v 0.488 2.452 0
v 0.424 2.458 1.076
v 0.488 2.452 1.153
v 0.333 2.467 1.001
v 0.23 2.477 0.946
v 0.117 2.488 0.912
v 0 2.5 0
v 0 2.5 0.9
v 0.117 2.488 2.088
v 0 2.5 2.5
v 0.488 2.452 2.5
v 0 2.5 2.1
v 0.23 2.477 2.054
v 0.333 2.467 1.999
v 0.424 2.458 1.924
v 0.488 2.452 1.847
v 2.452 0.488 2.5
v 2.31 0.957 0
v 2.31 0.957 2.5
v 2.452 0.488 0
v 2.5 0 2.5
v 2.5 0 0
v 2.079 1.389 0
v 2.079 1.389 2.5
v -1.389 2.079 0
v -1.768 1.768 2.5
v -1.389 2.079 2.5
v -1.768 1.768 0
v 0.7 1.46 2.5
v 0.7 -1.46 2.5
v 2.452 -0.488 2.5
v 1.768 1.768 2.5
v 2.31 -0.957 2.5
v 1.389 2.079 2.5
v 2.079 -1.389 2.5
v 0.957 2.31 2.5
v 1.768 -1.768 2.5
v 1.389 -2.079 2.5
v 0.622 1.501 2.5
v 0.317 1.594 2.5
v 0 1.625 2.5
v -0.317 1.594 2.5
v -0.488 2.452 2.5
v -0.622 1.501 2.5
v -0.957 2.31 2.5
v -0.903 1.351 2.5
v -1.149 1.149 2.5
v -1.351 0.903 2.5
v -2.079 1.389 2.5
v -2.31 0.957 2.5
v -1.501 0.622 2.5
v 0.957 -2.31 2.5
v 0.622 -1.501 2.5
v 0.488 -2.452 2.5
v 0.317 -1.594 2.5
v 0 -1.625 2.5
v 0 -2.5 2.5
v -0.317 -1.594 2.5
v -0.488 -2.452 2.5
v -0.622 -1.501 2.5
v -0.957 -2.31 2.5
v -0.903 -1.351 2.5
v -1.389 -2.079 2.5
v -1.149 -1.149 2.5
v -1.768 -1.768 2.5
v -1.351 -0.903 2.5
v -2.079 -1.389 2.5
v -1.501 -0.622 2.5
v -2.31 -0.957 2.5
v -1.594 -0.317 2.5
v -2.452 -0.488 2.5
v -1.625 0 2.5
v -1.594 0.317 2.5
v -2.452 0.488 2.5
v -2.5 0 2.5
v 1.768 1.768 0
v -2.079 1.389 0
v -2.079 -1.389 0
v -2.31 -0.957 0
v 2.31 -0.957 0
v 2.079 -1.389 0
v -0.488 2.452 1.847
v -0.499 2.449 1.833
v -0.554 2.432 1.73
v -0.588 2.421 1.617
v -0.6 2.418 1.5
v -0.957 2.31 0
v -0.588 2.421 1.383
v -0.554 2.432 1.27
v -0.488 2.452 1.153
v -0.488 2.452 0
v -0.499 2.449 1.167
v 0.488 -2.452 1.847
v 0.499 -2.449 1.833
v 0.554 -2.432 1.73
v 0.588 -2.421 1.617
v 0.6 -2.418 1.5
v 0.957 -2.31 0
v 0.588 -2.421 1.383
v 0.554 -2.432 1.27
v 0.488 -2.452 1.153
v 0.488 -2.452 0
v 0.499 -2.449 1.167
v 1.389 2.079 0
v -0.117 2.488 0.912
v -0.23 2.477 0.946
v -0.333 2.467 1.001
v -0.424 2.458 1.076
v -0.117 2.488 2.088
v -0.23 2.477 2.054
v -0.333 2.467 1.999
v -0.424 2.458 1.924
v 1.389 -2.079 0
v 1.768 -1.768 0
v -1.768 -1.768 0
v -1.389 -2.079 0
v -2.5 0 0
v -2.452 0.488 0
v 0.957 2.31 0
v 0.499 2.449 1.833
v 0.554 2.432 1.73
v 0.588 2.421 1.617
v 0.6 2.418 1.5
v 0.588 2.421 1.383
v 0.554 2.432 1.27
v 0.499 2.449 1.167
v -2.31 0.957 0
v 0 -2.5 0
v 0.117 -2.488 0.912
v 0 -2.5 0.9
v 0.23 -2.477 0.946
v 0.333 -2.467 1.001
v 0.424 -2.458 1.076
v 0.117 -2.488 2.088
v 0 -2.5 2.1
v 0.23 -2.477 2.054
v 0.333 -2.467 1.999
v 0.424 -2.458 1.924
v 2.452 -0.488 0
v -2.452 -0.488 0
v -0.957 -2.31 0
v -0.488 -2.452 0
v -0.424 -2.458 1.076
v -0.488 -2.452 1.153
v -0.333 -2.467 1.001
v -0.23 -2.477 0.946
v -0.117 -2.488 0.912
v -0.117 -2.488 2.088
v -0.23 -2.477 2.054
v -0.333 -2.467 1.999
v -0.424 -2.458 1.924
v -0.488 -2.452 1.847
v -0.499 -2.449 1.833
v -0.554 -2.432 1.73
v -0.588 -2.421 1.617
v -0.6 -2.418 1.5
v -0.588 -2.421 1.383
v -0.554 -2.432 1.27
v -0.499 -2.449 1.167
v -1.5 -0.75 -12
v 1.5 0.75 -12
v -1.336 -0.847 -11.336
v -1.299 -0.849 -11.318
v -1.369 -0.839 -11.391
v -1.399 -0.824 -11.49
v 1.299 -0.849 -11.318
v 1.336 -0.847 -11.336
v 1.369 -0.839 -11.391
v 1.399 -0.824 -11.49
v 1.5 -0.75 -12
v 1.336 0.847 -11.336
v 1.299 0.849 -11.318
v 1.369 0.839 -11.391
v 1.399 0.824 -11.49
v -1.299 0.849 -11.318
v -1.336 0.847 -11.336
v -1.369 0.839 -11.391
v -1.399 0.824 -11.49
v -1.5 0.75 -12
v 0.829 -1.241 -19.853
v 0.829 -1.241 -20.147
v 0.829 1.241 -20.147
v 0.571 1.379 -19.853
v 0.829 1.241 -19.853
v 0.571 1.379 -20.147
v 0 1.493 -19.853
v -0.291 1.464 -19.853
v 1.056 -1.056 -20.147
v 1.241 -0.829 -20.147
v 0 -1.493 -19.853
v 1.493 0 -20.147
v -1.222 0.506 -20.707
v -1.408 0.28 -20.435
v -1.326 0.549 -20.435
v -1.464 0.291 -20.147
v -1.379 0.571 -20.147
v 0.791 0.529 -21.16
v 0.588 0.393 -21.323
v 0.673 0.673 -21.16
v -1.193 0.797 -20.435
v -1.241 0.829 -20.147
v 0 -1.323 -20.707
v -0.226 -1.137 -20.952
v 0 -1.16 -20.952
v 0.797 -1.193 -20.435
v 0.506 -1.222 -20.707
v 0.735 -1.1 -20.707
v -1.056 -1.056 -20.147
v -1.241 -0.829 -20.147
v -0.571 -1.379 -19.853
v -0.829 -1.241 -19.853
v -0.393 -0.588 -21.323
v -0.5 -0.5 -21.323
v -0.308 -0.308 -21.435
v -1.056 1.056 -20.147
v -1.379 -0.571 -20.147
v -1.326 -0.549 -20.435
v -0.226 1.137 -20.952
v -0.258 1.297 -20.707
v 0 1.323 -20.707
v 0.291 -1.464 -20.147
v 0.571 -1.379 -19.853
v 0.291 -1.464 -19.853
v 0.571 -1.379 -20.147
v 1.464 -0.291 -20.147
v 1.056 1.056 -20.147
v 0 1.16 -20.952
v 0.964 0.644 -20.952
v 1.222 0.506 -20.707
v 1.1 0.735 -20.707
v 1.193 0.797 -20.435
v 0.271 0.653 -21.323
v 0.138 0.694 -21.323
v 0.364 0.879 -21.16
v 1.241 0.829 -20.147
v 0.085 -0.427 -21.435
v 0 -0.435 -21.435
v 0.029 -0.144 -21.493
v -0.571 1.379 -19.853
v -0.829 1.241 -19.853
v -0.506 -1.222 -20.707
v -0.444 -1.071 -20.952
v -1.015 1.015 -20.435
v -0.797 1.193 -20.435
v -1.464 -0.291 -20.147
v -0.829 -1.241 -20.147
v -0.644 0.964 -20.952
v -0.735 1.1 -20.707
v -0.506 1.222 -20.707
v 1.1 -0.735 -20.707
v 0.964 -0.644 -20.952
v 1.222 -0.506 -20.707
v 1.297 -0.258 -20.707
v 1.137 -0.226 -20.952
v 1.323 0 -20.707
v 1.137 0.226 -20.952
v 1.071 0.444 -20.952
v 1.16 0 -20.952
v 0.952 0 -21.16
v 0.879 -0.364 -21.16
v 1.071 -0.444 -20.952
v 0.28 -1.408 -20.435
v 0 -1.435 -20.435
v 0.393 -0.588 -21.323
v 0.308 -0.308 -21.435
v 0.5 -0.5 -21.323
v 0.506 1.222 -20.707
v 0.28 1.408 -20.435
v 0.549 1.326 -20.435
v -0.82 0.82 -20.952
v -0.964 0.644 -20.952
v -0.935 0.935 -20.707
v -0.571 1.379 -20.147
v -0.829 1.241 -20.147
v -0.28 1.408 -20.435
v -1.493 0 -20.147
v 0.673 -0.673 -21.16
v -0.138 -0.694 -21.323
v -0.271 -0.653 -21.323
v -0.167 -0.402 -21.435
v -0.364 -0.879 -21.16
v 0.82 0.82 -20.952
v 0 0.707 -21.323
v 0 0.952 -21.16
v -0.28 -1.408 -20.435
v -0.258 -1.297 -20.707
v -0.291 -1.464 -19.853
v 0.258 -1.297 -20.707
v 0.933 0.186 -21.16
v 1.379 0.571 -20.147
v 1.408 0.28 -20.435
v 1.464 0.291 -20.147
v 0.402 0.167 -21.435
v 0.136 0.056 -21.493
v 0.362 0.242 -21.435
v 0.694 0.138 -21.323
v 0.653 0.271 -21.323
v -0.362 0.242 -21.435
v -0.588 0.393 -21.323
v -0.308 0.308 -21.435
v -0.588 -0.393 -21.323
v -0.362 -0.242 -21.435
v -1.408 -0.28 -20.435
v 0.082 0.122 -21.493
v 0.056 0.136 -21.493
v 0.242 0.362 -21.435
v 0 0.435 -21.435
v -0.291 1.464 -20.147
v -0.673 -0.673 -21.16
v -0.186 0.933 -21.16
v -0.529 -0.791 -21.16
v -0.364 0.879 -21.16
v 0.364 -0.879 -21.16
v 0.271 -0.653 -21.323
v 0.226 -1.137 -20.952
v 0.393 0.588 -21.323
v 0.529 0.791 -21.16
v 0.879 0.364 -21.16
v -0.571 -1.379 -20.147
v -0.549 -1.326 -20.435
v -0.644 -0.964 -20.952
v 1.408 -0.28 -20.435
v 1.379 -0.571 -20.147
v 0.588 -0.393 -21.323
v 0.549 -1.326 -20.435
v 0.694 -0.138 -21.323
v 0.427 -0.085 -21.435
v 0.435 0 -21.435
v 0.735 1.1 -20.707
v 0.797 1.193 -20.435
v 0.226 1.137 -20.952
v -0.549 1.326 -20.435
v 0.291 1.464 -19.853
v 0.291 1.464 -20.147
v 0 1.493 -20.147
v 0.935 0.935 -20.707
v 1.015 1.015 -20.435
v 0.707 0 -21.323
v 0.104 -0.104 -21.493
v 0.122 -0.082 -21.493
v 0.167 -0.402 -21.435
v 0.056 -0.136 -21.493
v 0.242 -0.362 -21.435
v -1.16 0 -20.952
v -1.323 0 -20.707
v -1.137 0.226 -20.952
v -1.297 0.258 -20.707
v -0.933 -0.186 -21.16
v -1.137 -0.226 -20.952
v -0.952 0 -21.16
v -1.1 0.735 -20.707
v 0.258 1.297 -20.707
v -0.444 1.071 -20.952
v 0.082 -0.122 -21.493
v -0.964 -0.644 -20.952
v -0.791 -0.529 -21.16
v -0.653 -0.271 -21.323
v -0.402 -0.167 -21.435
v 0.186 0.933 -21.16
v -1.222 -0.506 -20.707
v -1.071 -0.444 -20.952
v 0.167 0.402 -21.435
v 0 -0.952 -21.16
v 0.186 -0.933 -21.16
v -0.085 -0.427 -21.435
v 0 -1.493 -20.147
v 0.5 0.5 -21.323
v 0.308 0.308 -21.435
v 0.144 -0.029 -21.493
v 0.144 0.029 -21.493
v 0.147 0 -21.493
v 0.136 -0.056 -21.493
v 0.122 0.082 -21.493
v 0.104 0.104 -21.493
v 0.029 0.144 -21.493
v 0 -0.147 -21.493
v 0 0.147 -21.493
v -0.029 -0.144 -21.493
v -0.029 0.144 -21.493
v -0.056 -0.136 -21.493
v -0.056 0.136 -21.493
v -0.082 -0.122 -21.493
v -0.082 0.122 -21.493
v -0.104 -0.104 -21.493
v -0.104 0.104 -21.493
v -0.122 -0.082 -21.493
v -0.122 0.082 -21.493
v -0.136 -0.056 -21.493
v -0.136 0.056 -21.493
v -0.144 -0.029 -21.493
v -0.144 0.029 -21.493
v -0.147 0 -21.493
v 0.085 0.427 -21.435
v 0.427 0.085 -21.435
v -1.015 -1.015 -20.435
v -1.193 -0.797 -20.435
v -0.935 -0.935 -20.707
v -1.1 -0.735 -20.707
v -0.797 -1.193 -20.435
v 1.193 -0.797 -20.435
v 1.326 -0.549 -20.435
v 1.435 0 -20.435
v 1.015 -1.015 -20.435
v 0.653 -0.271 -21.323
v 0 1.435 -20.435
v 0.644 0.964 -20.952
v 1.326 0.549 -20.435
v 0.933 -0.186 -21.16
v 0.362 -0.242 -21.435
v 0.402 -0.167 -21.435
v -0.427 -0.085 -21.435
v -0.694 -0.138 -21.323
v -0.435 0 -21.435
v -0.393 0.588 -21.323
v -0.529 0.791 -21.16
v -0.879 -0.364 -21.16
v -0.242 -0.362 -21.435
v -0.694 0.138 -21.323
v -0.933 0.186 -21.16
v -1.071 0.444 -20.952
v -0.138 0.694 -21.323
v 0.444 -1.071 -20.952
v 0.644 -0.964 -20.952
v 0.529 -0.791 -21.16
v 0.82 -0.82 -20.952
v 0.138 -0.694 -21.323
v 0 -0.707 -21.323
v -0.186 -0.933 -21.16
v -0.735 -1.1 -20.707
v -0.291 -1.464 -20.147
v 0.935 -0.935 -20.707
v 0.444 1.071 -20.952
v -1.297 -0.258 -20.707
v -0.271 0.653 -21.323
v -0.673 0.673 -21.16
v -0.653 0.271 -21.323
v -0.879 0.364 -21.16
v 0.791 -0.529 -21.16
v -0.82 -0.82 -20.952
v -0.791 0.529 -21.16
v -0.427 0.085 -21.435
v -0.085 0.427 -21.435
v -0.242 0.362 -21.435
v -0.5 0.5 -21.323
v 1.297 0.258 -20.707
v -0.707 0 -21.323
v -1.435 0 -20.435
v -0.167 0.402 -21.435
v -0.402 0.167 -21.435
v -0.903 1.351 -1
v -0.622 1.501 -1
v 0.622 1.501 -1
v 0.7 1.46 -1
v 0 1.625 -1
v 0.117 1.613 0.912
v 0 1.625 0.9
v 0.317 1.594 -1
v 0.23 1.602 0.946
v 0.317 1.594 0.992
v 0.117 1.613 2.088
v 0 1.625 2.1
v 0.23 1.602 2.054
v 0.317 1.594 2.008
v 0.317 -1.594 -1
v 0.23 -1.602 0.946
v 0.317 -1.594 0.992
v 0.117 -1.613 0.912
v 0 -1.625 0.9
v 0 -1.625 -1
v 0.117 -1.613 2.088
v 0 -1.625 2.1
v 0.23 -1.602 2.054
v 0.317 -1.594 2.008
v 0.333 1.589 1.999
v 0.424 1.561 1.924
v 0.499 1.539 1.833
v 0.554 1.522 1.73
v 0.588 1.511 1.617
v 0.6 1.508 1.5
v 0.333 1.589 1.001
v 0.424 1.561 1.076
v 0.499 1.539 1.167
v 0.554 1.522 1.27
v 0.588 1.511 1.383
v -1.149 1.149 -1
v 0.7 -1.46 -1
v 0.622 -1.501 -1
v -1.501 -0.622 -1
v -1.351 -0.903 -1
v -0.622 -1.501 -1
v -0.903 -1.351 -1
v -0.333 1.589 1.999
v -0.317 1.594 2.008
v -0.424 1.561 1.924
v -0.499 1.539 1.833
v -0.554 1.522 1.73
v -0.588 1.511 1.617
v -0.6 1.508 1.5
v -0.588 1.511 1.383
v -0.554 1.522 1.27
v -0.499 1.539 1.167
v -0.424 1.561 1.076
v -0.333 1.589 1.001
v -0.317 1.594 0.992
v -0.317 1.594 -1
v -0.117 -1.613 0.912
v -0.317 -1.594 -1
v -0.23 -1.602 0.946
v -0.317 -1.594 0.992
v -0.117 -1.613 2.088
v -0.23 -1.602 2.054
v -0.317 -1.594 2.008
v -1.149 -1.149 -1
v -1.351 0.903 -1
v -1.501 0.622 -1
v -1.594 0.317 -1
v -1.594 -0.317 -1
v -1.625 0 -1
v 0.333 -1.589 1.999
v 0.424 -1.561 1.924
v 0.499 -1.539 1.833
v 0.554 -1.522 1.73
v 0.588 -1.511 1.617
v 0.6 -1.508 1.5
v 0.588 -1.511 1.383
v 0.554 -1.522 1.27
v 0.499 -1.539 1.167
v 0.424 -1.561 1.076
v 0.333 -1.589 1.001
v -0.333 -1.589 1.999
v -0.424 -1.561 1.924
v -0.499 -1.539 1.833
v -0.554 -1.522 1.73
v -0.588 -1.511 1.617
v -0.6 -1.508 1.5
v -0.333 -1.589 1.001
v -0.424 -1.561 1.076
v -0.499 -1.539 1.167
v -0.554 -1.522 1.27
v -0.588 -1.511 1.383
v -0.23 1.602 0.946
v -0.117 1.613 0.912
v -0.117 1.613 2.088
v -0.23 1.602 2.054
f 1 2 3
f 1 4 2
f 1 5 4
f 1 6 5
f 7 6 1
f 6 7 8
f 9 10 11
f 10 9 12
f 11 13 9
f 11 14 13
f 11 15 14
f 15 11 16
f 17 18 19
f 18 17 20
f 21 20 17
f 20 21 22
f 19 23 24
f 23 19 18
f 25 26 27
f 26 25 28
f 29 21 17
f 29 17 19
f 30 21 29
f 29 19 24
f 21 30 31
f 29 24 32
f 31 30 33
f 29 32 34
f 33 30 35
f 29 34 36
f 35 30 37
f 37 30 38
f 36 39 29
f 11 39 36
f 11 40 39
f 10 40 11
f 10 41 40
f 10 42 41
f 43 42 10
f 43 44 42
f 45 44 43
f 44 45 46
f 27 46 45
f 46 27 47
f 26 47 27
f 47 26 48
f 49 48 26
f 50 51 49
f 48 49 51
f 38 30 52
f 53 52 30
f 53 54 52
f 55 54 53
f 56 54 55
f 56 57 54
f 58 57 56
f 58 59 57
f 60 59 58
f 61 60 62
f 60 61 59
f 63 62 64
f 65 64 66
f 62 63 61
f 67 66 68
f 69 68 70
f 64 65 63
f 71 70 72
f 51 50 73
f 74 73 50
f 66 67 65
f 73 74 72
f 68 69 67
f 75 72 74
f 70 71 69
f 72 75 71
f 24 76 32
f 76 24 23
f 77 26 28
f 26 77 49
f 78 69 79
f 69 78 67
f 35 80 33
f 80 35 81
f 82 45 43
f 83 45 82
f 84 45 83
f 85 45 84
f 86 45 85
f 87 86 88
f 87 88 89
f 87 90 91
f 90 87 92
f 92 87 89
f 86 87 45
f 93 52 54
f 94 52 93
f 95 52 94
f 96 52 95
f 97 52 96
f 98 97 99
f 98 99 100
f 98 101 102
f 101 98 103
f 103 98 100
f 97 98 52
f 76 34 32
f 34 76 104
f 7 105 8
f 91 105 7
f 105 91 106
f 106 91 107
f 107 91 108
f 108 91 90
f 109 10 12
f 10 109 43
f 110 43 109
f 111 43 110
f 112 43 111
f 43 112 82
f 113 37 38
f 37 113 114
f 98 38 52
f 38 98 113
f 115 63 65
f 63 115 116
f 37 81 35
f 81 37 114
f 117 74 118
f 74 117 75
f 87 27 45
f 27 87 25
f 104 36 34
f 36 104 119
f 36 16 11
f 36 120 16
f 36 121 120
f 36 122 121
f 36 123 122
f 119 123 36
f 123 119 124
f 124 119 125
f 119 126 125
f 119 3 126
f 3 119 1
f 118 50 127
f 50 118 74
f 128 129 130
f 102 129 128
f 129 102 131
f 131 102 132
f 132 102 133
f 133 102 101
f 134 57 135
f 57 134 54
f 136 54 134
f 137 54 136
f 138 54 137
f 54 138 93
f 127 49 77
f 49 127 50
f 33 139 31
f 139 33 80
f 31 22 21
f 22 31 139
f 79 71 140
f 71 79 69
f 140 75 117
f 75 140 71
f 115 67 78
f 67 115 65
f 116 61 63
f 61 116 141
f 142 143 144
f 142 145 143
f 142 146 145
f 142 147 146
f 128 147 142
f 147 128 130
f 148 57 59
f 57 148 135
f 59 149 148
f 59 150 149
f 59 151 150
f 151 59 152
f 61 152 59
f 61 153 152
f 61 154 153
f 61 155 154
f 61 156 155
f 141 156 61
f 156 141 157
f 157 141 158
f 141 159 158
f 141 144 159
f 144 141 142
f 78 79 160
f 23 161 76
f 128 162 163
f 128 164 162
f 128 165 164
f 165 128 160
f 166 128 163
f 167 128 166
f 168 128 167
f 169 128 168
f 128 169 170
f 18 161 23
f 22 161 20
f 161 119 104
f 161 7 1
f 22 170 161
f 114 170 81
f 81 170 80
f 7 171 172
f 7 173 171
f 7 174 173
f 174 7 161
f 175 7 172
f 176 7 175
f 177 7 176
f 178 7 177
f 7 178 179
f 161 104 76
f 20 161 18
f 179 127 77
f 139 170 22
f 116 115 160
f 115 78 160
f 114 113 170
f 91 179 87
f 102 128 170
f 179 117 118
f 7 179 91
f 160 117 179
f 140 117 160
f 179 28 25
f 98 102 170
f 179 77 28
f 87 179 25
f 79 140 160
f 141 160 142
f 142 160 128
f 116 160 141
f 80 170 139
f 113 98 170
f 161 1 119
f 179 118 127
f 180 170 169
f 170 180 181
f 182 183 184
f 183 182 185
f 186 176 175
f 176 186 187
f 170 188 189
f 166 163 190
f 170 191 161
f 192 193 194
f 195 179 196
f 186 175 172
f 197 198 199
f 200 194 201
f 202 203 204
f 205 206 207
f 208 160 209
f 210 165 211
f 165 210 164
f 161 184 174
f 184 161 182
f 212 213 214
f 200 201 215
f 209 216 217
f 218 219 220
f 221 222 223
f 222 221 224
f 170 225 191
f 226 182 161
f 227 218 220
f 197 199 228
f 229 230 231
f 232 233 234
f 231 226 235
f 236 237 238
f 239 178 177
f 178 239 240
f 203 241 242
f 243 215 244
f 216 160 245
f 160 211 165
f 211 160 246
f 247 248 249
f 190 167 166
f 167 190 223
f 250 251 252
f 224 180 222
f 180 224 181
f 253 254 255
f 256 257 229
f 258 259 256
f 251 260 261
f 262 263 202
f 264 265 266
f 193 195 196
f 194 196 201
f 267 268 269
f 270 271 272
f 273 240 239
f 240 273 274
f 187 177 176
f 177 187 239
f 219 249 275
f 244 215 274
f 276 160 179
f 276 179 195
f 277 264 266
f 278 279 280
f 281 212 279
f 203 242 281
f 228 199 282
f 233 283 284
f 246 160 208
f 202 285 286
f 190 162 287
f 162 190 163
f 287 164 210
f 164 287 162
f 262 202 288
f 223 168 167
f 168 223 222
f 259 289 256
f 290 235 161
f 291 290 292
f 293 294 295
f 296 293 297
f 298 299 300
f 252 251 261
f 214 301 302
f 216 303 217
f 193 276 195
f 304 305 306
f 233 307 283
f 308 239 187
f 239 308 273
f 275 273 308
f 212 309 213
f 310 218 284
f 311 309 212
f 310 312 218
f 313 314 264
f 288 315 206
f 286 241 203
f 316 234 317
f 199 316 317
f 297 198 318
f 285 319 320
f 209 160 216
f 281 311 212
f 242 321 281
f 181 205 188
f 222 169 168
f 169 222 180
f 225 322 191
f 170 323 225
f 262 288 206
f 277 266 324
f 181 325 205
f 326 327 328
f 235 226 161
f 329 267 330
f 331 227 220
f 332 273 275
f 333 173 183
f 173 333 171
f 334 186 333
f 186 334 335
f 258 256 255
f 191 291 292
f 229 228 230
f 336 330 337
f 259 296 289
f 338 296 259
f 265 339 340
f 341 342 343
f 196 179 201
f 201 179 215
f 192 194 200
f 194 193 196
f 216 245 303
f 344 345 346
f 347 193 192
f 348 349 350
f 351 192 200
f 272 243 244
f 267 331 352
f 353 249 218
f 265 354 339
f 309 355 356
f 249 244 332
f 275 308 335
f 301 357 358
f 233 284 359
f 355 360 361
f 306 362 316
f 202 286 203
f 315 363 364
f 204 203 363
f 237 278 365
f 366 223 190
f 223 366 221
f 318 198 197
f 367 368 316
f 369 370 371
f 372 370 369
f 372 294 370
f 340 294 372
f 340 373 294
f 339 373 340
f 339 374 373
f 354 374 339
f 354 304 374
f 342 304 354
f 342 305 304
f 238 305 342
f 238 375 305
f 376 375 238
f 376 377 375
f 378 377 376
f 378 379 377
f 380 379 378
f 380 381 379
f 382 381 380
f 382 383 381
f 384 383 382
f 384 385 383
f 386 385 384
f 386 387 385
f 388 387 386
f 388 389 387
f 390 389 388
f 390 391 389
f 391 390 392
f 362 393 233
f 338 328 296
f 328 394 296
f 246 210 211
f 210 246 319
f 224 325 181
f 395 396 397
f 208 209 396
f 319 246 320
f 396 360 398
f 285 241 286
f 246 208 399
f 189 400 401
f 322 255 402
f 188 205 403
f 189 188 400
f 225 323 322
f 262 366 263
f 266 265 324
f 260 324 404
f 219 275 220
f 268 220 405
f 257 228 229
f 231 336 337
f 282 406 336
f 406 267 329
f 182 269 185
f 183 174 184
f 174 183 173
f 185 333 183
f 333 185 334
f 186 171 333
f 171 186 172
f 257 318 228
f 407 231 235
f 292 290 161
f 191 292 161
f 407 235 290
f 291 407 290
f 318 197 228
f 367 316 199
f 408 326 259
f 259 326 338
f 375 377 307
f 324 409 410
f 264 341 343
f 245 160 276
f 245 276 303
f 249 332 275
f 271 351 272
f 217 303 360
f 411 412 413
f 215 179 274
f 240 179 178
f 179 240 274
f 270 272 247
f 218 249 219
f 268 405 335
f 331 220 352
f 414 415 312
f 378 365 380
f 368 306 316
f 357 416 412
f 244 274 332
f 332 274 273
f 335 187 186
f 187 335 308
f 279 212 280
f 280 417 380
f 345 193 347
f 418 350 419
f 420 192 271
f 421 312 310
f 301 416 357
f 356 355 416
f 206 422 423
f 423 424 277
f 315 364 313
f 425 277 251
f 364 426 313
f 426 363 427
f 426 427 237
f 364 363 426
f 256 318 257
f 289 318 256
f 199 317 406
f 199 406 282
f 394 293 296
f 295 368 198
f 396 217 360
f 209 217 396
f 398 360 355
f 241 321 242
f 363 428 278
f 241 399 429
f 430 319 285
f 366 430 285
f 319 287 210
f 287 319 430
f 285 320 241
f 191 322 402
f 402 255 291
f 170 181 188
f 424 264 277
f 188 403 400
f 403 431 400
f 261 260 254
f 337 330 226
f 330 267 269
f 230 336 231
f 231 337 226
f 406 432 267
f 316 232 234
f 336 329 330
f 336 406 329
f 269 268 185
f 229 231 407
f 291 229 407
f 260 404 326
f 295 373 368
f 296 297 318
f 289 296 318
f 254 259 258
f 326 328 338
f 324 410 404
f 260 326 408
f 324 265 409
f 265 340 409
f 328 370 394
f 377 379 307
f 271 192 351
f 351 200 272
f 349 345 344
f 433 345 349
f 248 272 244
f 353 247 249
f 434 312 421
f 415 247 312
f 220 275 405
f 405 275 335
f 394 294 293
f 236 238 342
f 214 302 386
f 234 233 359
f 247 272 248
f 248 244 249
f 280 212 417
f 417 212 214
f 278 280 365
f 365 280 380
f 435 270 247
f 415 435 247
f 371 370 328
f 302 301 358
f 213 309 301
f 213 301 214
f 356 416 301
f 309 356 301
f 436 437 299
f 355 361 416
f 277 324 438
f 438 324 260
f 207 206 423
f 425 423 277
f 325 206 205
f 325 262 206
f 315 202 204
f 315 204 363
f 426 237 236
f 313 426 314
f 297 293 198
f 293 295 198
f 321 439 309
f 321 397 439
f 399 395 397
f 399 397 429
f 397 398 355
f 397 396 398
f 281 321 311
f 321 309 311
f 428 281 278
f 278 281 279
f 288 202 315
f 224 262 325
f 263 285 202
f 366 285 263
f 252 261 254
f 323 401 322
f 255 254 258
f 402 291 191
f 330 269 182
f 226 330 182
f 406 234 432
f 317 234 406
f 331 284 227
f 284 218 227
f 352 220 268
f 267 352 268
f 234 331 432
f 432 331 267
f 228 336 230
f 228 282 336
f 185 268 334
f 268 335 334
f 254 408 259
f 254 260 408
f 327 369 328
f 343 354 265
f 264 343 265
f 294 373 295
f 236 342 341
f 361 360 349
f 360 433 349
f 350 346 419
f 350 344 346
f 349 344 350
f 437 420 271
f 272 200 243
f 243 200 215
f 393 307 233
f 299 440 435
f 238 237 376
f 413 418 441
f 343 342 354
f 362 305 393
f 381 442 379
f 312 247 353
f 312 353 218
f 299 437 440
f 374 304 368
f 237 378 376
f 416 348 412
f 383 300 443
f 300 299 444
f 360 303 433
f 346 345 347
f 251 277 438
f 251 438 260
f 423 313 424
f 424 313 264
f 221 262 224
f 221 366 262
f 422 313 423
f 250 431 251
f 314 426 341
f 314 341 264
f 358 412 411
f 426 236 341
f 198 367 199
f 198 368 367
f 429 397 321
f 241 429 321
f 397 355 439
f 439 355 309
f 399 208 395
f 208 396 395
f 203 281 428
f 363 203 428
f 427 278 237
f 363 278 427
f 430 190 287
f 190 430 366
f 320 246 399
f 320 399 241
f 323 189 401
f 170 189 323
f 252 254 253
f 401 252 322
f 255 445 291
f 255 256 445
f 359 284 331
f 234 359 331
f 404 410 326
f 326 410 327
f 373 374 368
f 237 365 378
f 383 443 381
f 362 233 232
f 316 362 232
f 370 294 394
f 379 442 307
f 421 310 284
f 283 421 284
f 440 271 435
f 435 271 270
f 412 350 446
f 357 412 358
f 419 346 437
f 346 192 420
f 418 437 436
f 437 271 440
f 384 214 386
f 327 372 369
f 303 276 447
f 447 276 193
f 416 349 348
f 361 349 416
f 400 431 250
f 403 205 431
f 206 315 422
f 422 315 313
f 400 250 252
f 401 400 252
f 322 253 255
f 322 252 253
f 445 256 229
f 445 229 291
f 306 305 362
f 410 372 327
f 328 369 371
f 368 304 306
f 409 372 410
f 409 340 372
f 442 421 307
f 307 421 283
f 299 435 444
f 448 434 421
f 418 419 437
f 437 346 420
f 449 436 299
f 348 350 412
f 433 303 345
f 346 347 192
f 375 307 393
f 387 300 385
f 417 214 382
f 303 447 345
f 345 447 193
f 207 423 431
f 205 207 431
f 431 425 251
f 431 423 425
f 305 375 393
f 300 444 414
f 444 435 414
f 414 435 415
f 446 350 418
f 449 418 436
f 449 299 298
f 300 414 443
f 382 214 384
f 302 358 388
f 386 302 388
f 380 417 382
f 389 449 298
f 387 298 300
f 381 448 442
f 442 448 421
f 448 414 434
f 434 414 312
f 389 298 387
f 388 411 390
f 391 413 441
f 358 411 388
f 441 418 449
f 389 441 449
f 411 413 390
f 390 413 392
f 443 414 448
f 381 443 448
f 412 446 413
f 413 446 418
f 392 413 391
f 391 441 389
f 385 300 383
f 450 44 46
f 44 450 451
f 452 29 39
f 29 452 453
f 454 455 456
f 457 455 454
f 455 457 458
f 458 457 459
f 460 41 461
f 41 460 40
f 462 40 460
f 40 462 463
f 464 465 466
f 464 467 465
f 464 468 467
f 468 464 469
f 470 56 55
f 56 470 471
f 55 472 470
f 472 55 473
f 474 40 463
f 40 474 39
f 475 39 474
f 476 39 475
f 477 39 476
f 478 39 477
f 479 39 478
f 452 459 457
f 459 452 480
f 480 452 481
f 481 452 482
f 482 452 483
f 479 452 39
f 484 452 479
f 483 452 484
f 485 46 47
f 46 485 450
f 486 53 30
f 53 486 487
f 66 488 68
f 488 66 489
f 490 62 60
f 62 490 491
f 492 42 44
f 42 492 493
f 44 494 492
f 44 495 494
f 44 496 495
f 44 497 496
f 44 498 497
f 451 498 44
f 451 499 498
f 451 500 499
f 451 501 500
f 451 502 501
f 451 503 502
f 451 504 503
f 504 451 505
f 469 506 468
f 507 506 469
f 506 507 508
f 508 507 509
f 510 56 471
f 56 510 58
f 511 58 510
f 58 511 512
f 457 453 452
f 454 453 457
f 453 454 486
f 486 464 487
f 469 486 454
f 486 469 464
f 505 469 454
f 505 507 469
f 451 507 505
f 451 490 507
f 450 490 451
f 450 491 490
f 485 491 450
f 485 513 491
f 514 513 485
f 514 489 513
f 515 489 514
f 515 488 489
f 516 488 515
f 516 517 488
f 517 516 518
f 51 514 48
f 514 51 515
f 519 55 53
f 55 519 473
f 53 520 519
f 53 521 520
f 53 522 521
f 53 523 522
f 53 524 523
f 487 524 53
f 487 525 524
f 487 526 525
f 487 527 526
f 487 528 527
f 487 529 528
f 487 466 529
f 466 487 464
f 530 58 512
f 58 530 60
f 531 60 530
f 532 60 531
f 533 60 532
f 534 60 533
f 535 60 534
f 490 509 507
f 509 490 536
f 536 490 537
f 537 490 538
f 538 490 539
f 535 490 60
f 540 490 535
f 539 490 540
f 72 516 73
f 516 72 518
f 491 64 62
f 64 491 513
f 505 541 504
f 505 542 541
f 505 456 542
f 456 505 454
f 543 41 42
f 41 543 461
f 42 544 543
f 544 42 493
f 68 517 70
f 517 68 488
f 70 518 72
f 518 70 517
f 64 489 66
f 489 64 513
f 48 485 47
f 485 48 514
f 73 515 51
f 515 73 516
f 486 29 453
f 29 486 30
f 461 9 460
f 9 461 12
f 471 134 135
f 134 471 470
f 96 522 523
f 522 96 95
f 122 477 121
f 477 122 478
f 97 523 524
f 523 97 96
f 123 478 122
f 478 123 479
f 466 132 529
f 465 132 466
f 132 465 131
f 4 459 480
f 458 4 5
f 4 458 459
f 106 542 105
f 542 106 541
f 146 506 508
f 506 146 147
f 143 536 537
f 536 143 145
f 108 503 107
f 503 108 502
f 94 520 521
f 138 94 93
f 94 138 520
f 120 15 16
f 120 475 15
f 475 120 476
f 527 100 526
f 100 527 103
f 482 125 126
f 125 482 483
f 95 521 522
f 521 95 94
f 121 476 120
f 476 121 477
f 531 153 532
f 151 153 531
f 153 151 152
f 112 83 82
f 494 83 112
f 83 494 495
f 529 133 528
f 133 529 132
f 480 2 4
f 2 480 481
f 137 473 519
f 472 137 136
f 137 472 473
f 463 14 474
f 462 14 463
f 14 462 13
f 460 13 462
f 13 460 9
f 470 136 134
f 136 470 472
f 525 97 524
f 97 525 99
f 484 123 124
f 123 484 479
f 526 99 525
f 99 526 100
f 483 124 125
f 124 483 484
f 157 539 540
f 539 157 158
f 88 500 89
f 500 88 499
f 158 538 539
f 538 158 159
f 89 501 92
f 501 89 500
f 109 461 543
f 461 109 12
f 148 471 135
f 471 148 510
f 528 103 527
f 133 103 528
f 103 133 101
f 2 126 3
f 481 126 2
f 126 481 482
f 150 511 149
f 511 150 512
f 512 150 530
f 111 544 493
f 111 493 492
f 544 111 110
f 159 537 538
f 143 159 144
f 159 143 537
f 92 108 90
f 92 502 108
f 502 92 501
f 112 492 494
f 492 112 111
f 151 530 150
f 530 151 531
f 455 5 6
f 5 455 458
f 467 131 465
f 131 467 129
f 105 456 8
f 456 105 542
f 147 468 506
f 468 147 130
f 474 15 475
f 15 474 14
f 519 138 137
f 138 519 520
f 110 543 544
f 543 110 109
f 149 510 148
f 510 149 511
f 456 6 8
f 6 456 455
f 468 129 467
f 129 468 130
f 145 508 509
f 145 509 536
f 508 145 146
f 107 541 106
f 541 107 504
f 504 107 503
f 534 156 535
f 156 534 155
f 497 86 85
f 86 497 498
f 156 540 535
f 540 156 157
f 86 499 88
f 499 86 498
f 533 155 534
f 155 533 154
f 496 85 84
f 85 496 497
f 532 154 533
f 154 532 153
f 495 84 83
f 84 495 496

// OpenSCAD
// file: config_10cm.scad
// ============================================
// NuiBone - 10cm版 共通設定ファイル
// ============================================
// 10cmぬいぐるみ用ロボット骨格の寸法設定
// ※サーボはSG90では大きすぎるため、
//   より小型のサーボを推奨
// ============================================

// --- ぬいぐるみサイズ制約 ---
nui_height = 100;        // ぬいぐるみ全高 (mm)
nui_body_width = 28;     // 胴体最大幅 (mm)
nui_body_depth = 18;     // 胴体最大厚み (mm)

// --- 骨格寸法 ---
bone_thickness = 2.0;    // 骨格基本厚み (mm)
bone_width = 2.5;        // 骨格基本幅 (mm)

// 胴体フレーム
body_height = 30;        // 胴体高さ (mm)
body_width = 24;         // 胴体幅 (mm)
body_depth = 14;         // 胴体奥行き (mm)

// 肩
shoulder_width = 6;      // 肩部品幅 (mm)
shoulder_offset = 10;    // 肩の高さ位置（胴体上端から）

// 腕
arm_length = 22;         // 腕の長さ (mm)
arm_width = 3;           // 腕の幅 (mm)
arm_thickness = 1.5;     // 腕の厚み (mm)

// 足
foot_width = 8;          // 足幅 (mm)
foot_length = 10;        // 足長さ (mm)
foot_height = 4;         // 足高さ (mm)
leg_length = 20;         // 脚の長さ (mm)

// --- サーボ選択 ---
// 10cm版では以下のいずれかを推奨:
// 1. SG51R (5g) - 最小クラス
// 2. HK-5320 (3.7g) - 超小型
// 3. 自作リニアアクチュエータ

// SG51R寸法 (参考)
servo_width = 6.0;       // サーボ幅 (mm)
servo_height = 15.0;     // サーボ高さ (mm)
servo_depth = 12.0;      // サーボ奥行き (mm)
servo_shaft_height = 3;  // 出力軸高さ (mm)
servo_shaft_dia = 3.0;   // 出力軸直径 (mm)

// --- 代替案: 振動モーター版 ---
// サーボの代わりに偏心モーターで「ぷるぷる」動作
vibration_motor_dia = 6; // 振動モーター直径 (mm)
vibration_motor_len = 12;// 振動モーター長さ (mm)

// --- 磁石・重り（10cm版用）---
magnet_dia = 3;          // ネオジム磁石直径 (mm) - より小さい
magnet_height = 1.5;     // ネオジム磁石高さ (mm)
weight_hole_dia = 4;     // 重り穴直径 (mm)

// --- 呼吸機構（10cm版）---
breath_stroke = 2;       // 呼吸ストローク (mm)
breath_plate_size = 10;  // 呼吸プレートサイズ (mm)

// --- 印刷設定 ---
wall_thick = 0.8;        // 壁厚み (mm) - より薄く
tolerance = 0.25;        // 組み立て公差 (mm)
$fn = 32;                // 円の分割数

// --- 色設定（プレビュー用）---
color_bone = [0.9, 0.9, 0.85];
color_servo = [0.2, 0.2, 0.3];
color_magnet = [0.7, 0.7, 0.7];

// ============================================
// 10cm版の制約と推奨事項
// ============================================
//
// 【課題】
// - SG90 (12.2mm幅) は10cmぬいぐるみには大きすぎる
// - 電池も単3では大きい
//
// 【推奨構成】
// 1. マイクロサーボ版
//    - サーボ: SG51R または HK-5320
//    - 電源: LiPo 1S (3.7V) 100-200mAh
//    - 制御: ESP32-C3 または Seeed XIAO
//
// 2. 振動モーター版（簡易版）
//    - 振動モーター × 2-3個
//    - 「ぷるぷる」動作で生命感を表現
//    - サーボ制御不要で省スペース
//
// 3. SMA (形状記憶合金) 版
//    - 超薄型で柔軟
//    - ゆっくりした動きに最適
//    - 呼吸表現に理想的
// ============================================
// main file
// ============================================
// NuiBone - 10cm版 腕ボーン
// ============================================
// マイクロサーボ用の小型腕
// ============================================

include <config_10cm.scad>

// --- 腕ボーン（マイクロサーボ版）---
module arm_bone_10cm() {
    difference() {
        union() {
            // サーボ軸接続部
            cylinder(h=2.5, d=servo_shaft_dia + 2);

            // 上腕
            hull() {
                cylinder(h=2, d=servo_shaft_dia + 2);
                translate([0, 0, -arm_length/2])
                    cube([arm_width, arm_thickness, 2], center=true);
            }

            // 前腕
            hull() {
                translate([0, 0, -arm_length/2])
                    cube([arm_width, arm_thickness, 2], center=true);
                translate([0, 0, -arm_length + 2])
                    sphere(d=arm_width);
            }
        }

        // サーボ軸穴（Dカット）
        difference() {
            translate([0, 0, -1])
                cylinder(h=4, d=servo_shaft_dia + tolerance);
            translate([servo_shaft_dia/2 - 0.3, 0, 0])
                cube([1, servo_shaft_dia, 5], center=true);
        }

        // 固定ネジ穴
        translate([0, 0, 1.5])
            rotate([90, 0, 0])
                cylinder(h=8, d=1.2, center=true);
    }
}

// --- 腕ボーン（振動モーター版）---
// モーターなしの装飾用腕
module arm_bone_10cm_passive() {
    // 肩ジョイント
    sphere(d=4);

    // 腕本体
    hull() {
        sphere(d=4);
        translate([0, 0, -arm_length + 3])
            sphere(d=arm_width);
    }

    // 手先
    translate([0, 0, -arm_length + 2])
        sphere(d=arm_width + 0.5);
}

// --- ワイヤー駆動版（オプション）---
// サーボから離れた位置にワイヤーで動かす
module arm_bone_10cm_wire() {
    difference() {
        union() {
            // 肩ピボット
            sphere(d=5);

            // 腕本体
            hull() {
                translate([0, 0, -2])
                    sphere(d=4);
                translate([0, 0, -arm_length + 2])
                    sphere(d=arm_width);
            }
        }

        // ピボット穴
        rotate([90, 0, 0])
            cylinder(h=8, d=1.5, center=true);

        // ワイヤー穴
        translate([0, 0, -arm_length/3])
            rotate([90, 0, 0])
                cylinder(h=6, d=1, center=true);
    }
}

// --- 印刷用パーツ展開 ---
module arm_parts_10cm_for_print() {
    // 左腕
    translate([0, 0, arm_length])
        rotate([180, 0, 0])
            arm_bone_10cm();

    // 右腕（ミラー）
    translate([15, 0, arm_length])
        rotate([180, 0, 0])
            mirror([1, 0, 0])
                arm_bone_10cm();

    // パッシブ腕（振動モーター版用）
    translate([30, 0, arm_length])
        rotate([180, 0, 0])
            arm_bone_10cm_passive();

    translate([40, 0, arm_length])
        rotate([180, 0, 0])
            arm_bone_10cm_passive();
}

// --- メイン出力 ---
arm_bone_10cm();

// 印刷用（コメントアウトで切替）
// arm_parts_10cm_for_print();
